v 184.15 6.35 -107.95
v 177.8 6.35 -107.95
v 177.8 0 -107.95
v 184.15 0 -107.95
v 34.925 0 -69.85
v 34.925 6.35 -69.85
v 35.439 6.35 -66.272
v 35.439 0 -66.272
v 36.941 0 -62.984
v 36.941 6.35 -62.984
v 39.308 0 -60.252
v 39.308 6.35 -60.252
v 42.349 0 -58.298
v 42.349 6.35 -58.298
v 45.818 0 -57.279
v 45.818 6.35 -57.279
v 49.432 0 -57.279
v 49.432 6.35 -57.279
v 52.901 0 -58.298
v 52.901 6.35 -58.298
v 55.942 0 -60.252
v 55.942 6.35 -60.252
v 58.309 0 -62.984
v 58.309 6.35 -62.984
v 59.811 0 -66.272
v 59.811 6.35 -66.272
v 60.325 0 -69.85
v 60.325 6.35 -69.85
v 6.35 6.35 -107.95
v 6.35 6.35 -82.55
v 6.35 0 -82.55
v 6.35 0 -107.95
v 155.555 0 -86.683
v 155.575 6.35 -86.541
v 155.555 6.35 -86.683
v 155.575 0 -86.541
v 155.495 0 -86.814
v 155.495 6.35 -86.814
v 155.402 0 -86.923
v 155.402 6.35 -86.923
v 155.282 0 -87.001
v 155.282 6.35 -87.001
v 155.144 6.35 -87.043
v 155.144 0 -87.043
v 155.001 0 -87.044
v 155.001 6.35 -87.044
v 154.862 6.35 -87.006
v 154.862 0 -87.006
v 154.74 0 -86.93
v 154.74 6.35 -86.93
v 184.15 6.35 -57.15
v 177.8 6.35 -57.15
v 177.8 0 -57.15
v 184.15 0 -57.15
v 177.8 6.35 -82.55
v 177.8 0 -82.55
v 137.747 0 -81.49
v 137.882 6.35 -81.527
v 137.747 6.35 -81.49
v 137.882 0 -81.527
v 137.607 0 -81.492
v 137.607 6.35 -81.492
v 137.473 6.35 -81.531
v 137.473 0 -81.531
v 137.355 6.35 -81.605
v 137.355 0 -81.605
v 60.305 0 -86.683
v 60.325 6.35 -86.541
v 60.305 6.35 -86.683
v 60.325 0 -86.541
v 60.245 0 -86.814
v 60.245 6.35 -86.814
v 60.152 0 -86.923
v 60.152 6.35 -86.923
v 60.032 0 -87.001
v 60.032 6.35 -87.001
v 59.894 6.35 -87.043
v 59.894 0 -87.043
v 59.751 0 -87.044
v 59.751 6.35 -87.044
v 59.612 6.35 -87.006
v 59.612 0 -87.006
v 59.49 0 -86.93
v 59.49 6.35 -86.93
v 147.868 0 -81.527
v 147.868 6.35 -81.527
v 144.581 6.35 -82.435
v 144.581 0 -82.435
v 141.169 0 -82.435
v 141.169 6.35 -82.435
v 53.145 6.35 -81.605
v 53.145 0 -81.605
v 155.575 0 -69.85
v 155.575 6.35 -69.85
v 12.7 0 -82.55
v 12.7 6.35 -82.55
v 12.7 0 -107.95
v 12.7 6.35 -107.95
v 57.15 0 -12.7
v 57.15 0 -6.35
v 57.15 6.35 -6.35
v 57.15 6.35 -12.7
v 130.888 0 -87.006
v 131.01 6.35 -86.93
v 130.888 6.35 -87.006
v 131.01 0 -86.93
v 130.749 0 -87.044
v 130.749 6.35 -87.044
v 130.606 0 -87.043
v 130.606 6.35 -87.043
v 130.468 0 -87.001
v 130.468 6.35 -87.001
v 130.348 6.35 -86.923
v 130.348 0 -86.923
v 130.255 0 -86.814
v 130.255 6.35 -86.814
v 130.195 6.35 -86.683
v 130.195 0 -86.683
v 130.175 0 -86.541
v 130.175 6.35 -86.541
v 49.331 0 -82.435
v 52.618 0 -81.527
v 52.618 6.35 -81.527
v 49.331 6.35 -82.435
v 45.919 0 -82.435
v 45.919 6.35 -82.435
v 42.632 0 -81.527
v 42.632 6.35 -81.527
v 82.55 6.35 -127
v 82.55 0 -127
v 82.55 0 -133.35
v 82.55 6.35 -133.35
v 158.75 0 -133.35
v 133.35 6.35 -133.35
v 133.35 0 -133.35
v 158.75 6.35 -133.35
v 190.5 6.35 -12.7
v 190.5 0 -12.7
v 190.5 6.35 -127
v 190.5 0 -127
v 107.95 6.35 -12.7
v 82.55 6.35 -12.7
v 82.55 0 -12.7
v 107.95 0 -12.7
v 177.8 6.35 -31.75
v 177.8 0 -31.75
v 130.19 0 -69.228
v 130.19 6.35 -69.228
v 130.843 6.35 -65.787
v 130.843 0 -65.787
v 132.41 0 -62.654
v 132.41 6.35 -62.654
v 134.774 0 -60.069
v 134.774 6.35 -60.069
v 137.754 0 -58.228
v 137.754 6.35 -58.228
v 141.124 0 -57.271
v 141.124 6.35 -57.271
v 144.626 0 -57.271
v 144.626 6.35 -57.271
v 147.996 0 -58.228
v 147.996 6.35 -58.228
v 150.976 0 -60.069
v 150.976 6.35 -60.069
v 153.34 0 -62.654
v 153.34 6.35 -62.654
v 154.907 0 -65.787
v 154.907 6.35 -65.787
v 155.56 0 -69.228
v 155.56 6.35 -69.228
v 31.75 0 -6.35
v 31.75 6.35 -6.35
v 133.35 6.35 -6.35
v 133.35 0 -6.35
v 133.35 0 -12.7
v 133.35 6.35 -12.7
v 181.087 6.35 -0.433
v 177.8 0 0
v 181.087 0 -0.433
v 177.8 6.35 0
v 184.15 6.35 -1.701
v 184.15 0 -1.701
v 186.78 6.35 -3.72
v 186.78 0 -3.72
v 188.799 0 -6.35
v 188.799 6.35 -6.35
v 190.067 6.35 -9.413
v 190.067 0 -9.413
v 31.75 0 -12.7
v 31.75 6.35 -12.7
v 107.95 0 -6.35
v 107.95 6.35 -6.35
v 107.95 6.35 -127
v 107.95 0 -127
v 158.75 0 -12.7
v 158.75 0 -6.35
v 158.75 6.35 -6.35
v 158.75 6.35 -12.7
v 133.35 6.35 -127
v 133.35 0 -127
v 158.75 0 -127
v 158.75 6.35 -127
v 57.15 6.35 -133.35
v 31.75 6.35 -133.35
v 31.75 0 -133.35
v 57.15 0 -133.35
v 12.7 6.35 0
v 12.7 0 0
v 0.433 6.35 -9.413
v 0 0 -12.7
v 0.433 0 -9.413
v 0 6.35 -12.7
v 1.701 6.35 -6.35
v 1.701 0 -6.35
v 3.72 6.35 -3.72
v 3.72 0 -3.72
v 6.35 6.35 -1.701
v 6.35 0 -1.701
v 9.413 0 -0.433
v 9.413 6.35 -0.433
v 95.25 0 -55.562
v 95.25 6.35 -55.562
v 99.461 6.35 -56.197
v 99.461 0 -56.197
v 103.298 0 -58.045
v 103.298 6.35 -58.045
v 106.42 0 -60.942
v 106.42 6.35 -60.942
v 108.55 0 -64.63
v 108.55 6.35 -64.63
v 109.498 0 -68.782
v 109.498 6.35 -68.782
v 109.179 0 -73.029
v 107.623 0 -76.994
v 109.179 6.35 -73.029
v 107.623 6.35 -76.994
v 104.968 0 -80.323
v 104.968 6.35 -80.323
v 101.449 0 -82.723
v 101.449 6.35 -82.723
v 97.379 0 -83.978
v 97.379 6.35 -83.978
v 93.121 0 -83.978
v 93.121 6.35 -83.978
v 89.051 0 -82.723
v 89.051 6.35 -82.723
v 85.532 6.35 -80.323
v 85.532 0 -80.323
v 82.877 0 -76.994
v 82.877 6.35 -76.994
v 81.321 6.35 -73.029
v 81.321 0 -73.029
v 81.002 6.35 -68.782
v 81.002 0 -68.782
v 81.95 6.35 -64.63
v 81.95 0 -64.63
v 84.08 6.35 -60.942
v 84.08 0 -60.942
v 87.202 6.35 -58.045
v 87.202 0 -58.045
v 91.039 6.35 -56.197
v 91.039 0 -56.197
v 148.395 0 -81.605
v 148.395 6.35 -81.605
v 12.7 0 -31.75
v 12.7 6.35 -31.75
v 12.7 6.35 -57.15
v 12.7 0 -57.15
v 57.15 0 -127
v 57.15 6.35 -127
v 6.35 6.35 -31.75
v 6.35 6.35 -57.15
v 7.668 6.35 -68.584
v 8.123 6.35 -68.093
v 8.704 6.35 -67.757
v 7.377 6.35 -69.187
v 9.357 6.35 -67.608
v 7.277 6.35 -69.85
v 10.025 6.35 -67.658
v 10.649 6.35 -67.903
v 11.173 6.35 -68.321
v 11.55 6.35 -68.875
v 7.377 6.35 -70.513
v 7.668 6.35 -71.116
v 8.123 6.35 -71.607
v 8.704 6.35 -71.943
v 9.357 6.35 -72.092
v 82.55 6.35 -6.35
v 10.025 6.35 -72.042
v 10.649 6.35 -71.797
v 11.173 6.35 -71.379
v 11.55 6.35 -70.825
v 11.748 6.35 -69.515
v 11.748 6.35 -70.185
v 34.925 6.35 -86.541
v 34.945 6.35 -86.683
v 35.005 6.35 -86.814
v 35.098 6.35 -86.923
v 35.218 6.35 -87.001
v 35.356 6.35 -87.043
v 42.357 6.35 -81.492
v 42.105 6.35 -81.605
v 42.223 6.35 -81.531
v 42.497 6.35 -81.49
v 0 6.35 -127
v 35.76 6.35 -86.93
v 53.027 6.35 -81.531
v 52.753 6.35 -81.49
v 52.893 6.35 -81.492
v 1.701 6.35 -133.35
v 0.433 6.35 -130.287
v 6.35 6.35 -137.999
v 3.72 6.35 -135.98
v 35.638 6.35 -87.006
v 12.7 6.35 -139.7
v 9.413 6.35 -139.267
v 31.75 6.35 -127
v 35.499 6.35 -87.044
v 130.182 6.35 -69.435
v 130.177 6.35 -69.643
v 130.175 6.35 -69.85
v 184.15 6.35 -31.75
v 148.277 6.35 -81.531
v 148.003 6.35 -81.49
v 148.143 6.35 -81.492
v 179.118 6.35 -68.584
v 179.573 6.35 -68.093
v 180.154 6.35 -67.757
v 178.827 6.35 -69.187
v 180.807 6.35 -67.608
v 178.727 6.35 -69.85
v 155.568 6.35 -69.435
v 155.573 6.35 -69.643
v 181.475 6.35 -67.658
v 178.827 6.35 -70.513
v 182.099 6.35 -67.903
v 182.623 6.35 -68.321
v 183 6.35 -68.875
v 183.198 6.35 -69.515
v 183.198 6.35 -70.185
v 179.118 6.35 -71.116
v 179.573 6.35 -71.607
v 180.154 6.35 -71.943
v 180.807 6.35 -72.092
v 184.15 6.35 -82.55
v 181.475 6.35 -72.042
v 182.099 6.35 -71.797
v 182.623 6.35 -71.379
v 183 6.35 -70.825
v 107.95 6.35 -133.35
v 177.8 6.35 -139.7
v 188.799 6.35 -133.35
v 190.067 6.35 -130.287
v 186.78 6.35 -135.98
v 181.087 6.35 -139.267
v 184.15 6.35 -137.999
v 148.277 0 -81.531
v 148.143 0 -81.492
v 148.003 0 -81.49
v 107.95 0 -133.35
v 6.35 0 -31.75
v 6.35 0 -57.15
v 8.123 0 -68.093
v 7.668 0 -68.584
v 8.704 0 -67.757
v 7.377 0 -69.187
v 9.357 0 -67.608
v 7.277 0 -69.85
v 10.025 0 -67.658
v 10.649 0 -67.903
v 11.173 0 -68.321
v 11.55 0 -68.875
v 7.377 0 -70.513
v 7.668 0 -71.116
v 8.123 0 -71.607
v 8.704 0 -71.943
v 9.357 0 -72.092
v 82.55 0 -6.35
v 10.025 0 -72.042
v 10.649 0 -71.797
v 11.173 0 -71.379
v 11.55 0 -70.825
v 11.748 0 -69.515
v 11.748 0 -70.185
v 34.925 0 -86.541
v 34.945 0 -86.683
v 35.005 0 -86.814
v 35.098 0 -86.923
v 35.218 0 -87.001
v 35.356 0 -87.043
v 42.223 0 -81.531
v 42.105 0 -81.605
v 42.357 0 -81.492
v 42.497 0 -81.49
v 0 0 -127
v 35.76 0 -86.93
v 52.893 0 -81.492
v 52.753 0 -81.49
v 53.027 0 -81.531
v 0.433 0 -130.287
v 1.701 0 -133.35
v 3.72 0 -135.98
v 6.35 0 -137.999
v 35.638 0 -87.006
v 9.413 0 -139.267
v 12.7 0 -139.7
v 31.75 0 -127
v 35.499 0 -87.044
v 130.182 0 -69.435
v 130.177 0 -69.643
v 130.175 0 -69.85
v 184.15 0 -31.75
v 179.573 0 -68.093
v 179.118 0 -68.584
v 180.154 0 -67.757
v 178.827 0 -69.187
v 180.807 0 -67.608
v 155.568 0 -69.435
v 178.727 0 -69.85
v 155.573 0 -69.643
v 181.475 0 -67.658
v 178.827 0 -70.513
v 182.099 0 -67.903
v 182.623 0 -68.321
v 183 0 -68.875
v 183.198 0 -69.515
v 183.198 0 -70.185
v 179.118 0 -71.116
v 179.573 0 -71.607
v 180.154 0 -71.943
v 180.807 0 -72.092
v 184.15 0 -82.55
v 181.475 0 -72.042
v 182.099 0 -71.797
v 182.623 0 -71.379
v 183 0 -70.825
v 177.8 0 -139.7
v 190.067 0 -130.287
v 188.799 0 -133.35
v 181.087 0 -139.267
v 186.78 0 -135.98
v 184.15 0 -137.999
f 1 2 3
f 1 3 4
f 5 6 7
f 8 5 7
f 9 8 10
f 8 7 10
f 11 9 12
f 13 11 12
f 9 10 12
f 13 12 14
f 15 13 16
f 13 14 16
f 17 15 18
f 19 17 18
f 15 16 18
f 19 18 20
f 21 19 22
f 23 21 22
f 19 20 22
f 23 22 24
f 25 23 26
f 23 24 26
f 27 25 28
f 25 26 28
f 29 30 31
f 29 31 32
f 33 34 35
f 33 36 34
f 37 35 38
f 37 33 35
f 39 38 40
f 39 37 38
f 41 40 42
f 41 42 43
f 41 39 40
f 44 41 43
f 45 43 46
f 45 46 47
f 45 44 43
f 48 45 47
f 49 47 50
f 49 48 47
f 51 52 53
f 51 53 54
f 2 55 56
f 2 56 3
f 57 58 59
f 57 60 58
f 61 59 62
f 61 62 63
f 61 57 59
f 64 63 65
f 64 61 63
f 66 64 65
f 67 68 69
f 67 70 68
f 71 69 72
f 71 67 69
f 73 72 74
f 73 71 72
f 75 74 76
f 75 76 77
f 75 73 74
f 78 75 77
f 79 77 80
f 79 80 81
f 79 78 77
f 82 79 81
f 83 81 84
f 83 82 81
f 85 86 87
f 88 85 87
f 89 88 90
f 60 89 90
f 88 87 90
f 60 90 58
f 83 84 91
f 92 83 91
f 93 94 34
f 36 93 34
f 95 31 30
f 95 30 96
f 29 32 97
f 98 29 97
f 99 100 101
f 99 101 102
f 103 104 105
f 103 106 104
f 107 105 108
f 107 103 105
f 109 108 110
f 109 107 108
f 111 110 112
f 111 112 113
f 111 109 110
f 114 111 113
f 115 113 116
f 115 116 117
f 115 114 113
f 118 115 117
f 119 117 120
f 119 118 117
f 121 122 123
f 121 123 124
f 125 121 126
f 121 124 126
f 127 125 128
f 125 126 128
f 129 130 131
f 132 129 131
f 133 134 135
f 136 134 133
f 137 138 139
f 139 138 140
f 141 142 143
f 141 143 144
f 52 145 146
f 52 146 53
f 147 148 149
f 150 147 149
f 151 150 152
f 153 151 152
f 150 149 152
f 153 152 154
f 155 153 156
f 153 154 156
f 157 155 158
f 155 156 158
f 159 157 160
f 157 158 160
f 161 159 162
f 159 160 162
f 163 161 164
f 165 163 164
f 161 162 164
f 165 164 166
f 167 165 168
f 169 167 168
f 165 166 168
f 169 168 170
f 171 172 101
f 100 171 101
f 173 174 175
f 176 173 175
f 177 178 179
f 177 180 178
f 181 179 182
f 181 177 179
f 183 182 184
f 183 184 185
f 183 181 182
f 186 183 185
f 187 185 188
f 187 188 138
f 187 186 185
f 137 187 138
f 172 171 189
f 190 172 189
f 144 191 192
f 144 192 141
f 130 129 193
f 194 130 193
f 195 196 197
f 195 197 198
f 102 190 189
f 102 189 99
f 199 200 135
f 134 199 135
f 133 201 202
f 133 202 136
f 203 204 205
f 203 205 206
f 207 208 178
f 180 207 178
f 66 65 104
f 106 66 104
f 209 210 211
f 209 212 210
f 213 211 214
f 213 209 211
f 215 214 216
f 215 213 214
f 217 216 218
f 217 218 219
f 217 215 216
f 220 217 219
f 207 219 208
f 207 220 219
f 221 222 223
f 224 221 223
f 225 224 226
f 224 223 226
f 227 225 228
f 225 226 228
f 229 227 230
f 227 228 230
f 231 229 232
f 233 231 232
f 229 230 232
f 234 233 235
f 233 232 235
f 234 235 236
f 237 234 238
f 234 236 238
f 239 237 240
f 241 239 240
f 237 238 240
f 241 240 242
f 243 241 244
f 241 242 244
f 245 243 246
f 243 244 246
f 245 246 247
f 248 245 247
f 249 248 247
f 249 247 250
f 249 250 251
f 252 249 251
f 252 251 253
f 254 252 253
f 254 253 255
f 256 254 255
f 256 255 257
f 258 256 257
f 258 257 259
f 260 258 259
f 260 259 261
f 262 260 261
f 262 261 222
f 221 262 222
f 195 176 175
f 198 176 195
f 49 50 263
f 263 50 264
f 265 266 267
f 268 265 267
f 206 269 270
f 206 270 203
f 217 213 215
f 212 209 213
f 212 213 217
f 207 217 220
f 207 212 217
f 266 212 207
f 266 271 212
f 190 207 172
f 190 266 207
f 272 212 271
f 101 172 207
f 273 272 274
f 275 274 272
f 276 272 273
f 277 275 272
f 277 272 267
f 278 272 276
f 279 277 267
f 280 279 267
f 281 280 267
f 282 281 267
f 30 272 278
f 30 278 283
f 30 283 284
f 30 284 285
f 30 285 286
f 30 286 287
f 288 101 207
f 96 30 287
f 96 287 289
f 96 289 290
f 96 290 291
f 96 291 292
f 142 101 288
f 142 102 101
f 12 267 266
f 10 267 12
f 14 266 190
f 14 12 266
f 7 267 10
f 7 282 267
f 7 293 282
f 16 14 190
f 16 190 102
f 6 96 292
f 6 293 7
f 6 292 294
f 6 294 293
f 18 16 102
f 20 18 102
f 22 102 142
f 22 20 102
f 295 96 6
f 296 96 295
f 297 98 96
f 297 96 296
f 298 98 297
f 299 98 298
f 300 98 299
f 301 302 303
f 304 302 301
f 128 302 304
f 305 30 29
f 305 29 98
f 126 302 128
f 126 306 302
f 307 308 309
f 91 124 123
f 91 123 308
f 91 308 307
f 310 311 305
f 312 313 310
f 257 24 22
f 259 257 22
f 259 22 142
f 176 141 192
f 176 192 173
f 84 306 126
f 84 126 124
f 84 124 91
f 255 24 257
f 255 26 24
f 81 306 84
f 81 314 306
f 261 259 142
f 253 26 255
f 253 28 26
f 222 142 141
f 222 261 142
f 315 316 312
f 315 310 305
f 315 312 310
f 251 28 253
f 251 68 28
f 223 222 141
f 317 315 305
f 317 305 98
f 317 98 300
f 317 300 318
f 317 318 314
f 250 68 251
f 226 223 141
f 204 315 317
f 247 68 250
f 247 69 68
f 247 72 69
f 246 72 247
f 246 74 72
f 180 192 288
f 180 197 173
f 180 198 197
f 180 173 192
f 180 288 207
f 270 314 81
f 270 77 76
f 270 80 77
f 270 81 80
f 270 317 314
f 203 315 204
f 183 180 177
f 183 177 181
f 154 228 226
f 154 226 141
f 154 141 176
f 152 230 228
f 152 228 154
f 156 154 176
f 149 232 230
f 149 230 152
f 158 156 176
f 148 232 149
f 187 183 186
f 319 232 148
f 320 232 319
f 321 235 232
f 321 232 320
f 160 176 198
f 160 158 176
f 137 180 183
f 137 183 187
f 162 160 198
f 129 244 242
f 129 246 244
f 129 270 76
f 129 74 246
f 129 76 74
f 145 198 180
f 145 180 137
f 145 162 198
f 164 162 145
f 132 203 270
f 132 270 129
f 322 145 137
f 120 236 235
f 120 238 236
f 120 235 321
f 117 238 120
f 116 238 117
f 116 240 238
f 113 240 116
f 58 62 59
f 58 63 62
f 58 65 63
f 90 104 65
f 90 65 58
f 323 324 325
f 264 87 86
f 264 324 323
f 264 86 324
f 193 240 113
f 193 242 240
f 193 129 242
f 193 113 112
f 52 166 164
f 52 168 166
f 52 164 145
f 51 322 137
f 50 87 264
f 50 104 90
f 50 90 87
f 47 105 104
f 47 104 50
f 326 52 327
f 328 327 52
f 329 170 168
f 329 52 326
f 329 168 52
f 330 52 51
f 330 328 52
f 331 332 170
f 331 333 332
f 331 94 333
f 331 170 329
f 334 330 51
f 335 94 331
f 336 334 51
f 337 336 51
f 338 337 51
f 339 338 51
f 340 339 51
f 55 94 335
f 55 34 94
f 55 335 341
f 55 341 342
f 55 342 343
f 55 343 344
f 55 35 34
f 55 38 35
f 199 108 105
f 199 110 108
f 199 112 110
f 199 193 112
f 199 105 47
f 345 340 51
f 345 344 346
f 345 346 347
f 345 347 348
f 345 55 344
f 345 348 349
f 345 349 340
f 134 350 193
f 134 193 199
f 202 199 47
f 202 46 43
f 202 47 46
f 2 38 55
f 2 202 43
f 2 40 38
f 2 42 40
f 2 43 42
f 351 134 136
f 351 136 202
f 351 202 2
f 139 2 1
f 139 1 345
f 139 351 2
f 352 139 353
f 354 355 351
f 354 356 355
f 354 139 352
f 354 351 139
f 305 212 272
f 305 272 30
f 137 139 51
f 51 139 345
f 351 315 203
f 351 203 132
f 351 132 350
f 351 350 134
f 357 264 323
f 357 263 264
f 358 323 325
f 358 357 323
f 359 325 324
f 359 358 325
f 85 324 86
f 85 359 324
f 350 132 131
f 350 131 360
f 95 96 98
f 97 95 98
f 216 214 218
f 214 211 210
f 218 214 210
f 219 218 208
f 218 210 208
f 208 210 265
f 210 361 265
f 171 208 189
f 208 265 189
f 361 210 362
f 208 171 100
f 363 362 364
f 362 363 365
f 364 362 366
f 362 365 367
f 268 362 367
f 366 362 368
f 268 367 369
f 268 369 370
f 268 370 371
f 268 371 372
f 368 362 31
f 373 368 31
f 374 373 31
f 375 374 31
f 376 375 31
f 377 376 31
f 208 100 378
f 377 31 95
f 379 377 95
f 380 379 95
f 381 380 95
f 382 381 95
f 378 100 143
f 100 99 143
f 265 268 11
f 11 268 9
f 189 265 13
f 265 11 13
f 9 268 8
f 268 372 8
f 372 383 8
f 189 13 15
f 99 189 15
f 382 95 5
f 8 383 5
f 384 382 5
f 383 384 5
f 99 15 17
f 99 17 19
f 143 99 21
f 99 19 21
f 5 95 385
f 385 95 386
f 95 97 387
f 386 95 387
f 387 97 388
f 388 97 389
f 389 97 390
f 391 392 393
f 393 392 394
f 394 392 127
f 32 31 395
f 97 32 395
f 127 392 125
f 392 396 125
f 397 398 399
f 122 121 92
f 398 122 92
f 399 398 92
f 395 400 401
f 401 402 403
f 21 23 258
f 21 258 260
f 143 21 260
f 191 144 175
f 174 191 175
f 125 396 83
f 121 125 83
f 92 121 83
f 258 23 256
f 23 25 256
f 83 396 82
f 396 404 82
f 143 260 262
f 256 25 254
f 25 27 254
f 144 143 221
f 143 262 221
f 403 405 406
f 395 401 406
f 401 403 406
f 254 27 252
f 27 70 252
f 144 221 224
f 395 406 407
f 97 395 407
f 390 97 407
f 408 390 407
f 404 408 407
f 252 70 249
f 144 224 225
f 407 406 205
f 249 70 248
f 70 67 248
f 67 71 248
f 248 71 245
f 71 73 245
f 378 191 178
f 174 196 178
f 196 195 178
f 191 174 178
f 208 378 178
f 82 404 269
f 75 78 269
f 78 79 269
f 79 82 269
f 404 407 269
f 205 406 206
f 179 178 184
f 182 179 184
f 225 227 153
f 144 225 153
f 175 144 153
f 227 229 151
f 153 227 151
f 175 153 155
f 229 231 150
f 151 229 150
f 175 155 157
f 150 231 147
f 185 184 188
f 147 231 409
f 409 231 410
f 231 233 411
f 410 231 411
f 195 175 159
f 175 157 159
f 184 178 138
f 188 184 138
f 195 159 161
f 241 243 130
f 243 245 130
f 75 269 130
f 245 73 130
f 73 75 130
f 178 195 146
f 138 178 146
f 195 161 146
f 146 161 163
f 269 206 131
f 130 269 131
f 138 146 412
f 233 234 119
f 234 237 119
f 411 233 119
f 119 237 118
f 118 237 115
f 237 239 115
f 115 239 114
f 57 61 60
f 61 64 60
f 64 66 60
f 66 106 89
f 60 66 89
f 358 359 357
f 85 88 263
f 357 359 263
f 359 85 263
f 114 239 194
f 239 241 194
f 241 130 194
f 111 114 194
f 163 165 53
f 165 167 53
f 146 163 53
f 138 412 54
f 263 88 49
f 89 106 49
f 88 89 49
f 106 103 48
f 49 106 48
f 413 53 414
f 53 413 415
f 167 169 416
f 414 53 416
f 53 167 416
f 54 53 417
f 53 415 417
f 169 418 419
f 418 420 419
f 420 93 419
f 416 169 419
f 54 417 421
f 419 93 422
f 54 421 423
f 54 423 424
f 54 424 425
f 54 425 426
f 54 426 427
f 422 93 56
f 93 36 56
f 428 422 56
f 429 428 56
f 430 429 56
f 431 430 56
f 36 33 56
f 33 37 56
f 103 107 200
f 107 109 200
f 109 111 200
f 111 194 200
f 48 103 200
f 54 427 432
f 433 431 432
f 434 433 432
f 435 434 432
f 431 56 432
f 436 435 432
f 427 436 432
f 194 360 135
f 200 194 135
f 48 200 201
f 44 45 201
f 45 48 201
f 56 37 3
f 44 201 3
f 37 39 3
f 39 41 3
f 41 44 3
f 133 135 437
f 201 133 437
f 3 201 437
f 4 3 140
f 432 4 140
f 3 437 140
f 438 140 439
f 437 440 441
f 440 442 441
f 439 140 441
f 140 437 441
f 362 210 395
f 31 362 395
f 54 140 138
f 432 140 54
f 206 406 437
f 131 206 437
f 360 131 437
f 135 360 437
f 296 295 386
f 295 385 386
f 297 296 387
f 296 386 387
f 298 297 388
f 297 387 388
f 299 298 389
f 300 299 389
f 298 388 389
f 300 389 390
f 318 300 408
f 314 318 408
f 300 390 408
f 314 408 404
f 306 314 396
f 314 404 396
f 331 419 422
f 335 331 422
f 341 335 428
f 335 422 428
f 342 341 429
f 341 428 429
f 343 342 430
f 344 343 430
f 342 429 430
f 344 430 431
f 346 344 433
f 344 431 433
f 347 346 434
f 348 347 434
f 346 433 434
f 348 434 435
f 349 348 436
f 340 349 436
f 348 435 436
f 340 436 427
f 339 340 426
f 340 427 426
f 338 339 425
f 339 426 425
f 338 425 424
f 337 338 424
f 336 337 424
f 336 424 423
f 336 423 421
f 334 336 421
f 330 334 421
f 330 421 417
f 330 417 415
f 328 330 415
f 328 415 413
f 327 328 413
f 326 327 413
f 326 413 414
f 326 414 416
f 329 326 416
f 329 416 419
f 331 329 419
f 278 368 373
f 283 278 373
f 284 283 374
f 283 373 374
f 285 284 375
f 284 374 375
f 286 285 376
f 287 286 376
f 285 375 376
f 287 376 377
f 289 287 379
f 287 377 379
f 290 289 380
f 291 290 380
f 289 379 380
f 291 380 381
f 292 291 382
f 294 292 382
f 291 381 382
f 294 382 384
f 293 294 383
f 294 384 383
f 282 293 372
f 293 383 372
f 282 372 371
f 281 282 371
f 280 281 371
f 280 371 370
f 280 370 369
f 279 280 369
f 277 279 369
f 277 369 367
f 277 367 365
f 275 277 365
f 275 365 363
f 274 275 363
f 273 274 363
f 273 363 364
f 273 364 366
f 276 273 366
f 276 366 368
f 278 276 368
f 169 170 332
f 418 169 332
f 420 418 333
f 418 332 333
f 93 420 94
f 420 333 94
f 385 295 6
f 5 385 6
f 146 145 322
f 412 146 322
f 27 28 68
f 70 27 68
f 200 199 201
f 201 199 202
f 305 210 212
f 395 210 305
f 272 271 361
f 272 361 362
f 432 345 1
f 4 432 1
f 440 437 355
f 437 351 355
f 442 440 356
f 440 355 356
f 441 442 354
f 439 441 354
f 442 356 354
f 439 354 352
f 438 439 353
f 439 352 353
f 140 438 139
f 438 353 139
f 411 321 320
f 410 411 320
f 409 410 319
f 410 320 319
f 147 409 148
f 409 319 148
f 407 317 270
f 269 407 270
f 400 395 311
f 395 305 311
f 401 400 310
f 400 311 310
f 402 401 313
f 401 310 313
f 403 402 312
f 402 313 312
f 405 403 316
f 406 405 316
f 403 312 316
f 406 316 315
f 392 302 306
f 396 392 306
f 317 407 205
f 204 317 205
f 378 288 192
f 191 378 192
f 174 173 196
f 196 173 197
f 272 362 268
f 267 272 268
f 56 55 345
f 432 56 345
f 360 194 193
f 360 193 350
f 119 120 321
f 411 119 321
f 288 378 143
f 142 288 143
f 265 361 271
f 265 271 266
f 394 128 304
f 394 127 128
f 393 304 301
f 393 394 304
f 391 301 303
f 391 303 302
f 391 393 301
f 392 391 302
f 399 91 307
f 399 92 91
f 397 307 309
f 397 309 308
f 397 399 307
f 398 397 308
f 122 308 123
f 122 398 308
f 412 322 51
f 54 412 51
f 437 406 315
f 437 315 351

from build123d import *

# Parameters (mm, degrees)
SKETCH1_W                 = 190.5
SKETCH1_H                 = 139.7
BOSS_EXTRUDE1_DEPTH       = 6.35
SKETCH13_W                = 25.4
SKETCH13_H                = 6.35
CUT_EXTRUDE6_DEPTH        = 6.35
LPATTERN7_COUNT           = 2
LPATTERN7_PITCH           = 120.65
SKETCH14_W                = 6.35
SKETCH14_H                = 25.4
CUT_EXTRUDE7_DEPTH        = 6.35
F_8_CLEARANCE_HOLE1_D     = 4.4958
F_8_CLEARANCE_HOLE1_DEPTH = 10.16
F_8_CLEARANCE_HOLE1_TIP   = 1.350674586
SKETCH18_R                = 14.2875
CUT_EXTRUDE9_DEPTH        = 7.62
CUT_EXTRUDE16_DEPTH       = 6.35
FILLET2_R                 = 0.508
CUT_EXTRUDE17_DEPTH       = 6.35
FILLET5_R                 = 0.508
FILLET6_R                 = 12.7


with BuildPart() as part:
    # Sketch1 → Boss-Extrude1 (new body)
    with BuildSketch(Plane(origin=(0, 0, 0), x_dir=(1, 0, 0), z_dir=(0, 1, 0))):
        with Locations((95.25, 69.85)):
            Rectangle(SKETCH1_W, SKETCH1_H)
    extrude(amount=BOSS_EXTRUDE1_DEPTH)

    # Sketch13 → Cut-Extrude6 (cut)
    with BuildSketch(Plane(origin=(0, 6.35, 0), x_dir=(1, 0, 0), z_dir=(0, 1, 0))):
        with Locations((44.45, 9.525)):
            Rectangle(SKETCH13_W, SKETCH13_H)
        with Locations((95.25, 9.525)):
            Rectangle(SKETCH13_W, SKETCH13_H)
        with Locations((146.05, 9.525)):
            Rectangle(SKETCH13_W, SKETCH13_H)
    cut_extrude6 = extrude(amount=-CUT_EXTRUDE6_DEPTH, mode=Mode.SUBTRACT)

    # LPattern7: Cut-Extrude6 ×2
    with Locations(*[(0, 0, -i * LPATTERN7_PITCH) for i in range(1, LPATTERN7_COUNT)]):
        add(cut_extrude6, mode=Mode.SUBTRACT)

    # Sketch14 → Cut-Extrude7 (cut)
    with BuildSketch(Plane(origin=(0, 6.35, 0), x_dir=(1, 0, 0), z_dir=(0, 1, 0))):
        with Locations((9.525, 44.45)):
            Rectangle(SKETCH14_W, SKETCH14_H)
        with Locations((180.975, 44.45)):
            Rectangle(SKETCH14_W, SKETCH14_H)
        with Locations((180.975, 95.25)):
            Rectangle(SKETCH14_W, SKETCH14_H)
        with Locations((9.525, 95.25)):
            Rectangle(SKETCH14_W, SKETCH14_H)
    extrude(amount=-CUT_EXTRUDE7_DEPTH, mode=Mode.SUBTRACT)

    # #8 Clearance Hole1
    with Locations(Plane(origin=(0, 6.35, 0), x_dir=(1, 0, 0), z_dir=(0, 1, 0))):
        with Locations((9.525, 69.85), (180.975, 69.85)):
            Hole(F_8_CLEARANCE_HOLE1_D / 2, depth=F_8_CLEARANCE_HOLE1_DEPTH)
            with Locations((0, 0, -(F_8_CLEARANCE_HOLE1_DEPTH + F_8_CLEARANCE_HOLE1_TIP / 2))):  # 118° drill point
                Cone(0, F_8_CLEARANCE_HOLE1_D / 2, F_8_CLEARANCE_HOLE1_TIP, mode=Mode.SUBTRACT)

    # Sketch18 → Cut-Extrude9 (cut)
    with BuildSketch(Plane(origin=(0, 6.35, 0), x_dir=(1, 0, 0), z_dir=(0, 1, 0))):
        with Locations(Location((95.25, 69.85, 0), (0, 0, 270))):
            Circle(SKETCH18_R)
    extrude(amount=-CUT_EXTRUDE9_DEPTH, mode=Mode.SUBTRACT)

    # Sketch24 → Cut-Extrude16 (cut)
    with BuildSketch(Plane(origin=(0, 6.35, 0), x_dir=(1, 0, 0), z_dir=(0, 1, 0))):
        with BuildLine():
            Line((34.925, 87.63), (34.925, 69.85))
            ThreePointArc((34.925, 69.85), (47.625, 57.15), (60.325, 69.85))
            Line((60.325, 69.85), (60.325, 87.63))
            Line((60.325, 87.63), (52.902309744, 81.401623344))
            ThreePointArc((52.902309744, 81.401623344), (47.625, 82.55), (42.347690256, 81.401623344))
            Line((42.347690256, 81.401623344), (34.925, 87.63))
        make_face()
    extrude(amount=-CUT_EXTRUDE16_DEPTH, mode=Mode.SUBTRACT)

    # Fillet2
    fillet2_edges = [part.edges().sort_by_distance(p)[0] for p in [
        (34.925, 3.175, -87.63),
        (42.347690256, 3.175, -81.401623344),
        (52.902309744, 3.175, -81.401623344),
        (60.325, 3.175, -87.63),
    ]]
    fillet(fillet2_edges, radius=FILLET2_R)

    # Sketch25 → Cut-Extrude17 (cut)
    with BuildSketch(Plane(origin=(0, 6.35, 0), x_dir=(1, 0, 0), z_dir=(0, 1, 0))):
        with BuildLine():
            ThreePointArc((135.255, 80.01), (131.515774674, 75.529612663), (130.175, 69.85))
            ThreePointArc((130.175, 69.85), (130.178809834, 69.538944895), (130.190237052, 69.228076416))
            ThreePointArc((130.190237052, 69.228076416), (142.875, 57.15), (155.559762948, 69.228076416))
            ThreePointArc((155.559762948, 69.228076416), (155.571190166, 69.538944895), (155.575, 69.85))
            ThreePointArc((155.575, 69.85), (154.234225326, 75.529612663), (150.495, 80.01))
            ThreePointArc((150.495, 80.01), (149.361085379, 80.768823035), (148.152309744, 81.401623344))
            ThreePointArc((148.152309744, 81.401623344), (142.875, 82.55), (137.597690256, 81.401623344))
            ThreePointArc((137.597690256, 81.401623344), (136.388914621, 80.768823035), (135.255, 80.01))
        make_face()
        with BuildLine():
            Line((137.597690256, 81.401623344), (130.175, 87.63))
            Line((130.175, 87.63), (130.175, 69.85))
            ThreePointArc((130.175, 69.85), (131.515774674, 75.529612663), (135.255, 80.01))
            ThreePointArc((135.255, 80.01), (136.388914621, 80.768823035), (137.597690256, 81.401623344))
        make_face()
        with BuildLine():
            Line((155.575, 87.63), (148.152309744, 81.401623344))
            ThreePointArc((148.152309744, 81.401623344), (149.361085379, 80.768823035), (150.495, 80.01))
            ThreePointArc((150.495, 80.01), (154.234225326, 75.529612663), (155.575, 69.85))
            Line((155.575, 69.85), (155.575, 87.63))
        make_face()
    extrude(amount=-CUT_EXTRUDE17_DEPTH, mode=Mode.SUBTRACT)

    # Fillet5
    fillet5_edges = [part.edges().sort_by_distance(p)[0] for p in [
        (130.175, 3.175, -87.63),
        (137.597690256, 3.175, -81.401623344),
        (148.152309744, 3.175, -81.401623344),
        (155.575, 3.175, -87.63),
    ]]
    fillet(fillet5_edges, radius=FILLET5_R)

    # Fillet6
    fillet6_edges = [part.edges().sort_by_distance(p)[0] for p in [
        (0, 3.175, -139.7),
        (190.5, 3.175, -139.7),
        (190.5, 3.175, 0),
        (0, 3.175, 0),
    ]]
    fillet(fillet6_edges, radius=FILLET6_R)


solid = part.part
